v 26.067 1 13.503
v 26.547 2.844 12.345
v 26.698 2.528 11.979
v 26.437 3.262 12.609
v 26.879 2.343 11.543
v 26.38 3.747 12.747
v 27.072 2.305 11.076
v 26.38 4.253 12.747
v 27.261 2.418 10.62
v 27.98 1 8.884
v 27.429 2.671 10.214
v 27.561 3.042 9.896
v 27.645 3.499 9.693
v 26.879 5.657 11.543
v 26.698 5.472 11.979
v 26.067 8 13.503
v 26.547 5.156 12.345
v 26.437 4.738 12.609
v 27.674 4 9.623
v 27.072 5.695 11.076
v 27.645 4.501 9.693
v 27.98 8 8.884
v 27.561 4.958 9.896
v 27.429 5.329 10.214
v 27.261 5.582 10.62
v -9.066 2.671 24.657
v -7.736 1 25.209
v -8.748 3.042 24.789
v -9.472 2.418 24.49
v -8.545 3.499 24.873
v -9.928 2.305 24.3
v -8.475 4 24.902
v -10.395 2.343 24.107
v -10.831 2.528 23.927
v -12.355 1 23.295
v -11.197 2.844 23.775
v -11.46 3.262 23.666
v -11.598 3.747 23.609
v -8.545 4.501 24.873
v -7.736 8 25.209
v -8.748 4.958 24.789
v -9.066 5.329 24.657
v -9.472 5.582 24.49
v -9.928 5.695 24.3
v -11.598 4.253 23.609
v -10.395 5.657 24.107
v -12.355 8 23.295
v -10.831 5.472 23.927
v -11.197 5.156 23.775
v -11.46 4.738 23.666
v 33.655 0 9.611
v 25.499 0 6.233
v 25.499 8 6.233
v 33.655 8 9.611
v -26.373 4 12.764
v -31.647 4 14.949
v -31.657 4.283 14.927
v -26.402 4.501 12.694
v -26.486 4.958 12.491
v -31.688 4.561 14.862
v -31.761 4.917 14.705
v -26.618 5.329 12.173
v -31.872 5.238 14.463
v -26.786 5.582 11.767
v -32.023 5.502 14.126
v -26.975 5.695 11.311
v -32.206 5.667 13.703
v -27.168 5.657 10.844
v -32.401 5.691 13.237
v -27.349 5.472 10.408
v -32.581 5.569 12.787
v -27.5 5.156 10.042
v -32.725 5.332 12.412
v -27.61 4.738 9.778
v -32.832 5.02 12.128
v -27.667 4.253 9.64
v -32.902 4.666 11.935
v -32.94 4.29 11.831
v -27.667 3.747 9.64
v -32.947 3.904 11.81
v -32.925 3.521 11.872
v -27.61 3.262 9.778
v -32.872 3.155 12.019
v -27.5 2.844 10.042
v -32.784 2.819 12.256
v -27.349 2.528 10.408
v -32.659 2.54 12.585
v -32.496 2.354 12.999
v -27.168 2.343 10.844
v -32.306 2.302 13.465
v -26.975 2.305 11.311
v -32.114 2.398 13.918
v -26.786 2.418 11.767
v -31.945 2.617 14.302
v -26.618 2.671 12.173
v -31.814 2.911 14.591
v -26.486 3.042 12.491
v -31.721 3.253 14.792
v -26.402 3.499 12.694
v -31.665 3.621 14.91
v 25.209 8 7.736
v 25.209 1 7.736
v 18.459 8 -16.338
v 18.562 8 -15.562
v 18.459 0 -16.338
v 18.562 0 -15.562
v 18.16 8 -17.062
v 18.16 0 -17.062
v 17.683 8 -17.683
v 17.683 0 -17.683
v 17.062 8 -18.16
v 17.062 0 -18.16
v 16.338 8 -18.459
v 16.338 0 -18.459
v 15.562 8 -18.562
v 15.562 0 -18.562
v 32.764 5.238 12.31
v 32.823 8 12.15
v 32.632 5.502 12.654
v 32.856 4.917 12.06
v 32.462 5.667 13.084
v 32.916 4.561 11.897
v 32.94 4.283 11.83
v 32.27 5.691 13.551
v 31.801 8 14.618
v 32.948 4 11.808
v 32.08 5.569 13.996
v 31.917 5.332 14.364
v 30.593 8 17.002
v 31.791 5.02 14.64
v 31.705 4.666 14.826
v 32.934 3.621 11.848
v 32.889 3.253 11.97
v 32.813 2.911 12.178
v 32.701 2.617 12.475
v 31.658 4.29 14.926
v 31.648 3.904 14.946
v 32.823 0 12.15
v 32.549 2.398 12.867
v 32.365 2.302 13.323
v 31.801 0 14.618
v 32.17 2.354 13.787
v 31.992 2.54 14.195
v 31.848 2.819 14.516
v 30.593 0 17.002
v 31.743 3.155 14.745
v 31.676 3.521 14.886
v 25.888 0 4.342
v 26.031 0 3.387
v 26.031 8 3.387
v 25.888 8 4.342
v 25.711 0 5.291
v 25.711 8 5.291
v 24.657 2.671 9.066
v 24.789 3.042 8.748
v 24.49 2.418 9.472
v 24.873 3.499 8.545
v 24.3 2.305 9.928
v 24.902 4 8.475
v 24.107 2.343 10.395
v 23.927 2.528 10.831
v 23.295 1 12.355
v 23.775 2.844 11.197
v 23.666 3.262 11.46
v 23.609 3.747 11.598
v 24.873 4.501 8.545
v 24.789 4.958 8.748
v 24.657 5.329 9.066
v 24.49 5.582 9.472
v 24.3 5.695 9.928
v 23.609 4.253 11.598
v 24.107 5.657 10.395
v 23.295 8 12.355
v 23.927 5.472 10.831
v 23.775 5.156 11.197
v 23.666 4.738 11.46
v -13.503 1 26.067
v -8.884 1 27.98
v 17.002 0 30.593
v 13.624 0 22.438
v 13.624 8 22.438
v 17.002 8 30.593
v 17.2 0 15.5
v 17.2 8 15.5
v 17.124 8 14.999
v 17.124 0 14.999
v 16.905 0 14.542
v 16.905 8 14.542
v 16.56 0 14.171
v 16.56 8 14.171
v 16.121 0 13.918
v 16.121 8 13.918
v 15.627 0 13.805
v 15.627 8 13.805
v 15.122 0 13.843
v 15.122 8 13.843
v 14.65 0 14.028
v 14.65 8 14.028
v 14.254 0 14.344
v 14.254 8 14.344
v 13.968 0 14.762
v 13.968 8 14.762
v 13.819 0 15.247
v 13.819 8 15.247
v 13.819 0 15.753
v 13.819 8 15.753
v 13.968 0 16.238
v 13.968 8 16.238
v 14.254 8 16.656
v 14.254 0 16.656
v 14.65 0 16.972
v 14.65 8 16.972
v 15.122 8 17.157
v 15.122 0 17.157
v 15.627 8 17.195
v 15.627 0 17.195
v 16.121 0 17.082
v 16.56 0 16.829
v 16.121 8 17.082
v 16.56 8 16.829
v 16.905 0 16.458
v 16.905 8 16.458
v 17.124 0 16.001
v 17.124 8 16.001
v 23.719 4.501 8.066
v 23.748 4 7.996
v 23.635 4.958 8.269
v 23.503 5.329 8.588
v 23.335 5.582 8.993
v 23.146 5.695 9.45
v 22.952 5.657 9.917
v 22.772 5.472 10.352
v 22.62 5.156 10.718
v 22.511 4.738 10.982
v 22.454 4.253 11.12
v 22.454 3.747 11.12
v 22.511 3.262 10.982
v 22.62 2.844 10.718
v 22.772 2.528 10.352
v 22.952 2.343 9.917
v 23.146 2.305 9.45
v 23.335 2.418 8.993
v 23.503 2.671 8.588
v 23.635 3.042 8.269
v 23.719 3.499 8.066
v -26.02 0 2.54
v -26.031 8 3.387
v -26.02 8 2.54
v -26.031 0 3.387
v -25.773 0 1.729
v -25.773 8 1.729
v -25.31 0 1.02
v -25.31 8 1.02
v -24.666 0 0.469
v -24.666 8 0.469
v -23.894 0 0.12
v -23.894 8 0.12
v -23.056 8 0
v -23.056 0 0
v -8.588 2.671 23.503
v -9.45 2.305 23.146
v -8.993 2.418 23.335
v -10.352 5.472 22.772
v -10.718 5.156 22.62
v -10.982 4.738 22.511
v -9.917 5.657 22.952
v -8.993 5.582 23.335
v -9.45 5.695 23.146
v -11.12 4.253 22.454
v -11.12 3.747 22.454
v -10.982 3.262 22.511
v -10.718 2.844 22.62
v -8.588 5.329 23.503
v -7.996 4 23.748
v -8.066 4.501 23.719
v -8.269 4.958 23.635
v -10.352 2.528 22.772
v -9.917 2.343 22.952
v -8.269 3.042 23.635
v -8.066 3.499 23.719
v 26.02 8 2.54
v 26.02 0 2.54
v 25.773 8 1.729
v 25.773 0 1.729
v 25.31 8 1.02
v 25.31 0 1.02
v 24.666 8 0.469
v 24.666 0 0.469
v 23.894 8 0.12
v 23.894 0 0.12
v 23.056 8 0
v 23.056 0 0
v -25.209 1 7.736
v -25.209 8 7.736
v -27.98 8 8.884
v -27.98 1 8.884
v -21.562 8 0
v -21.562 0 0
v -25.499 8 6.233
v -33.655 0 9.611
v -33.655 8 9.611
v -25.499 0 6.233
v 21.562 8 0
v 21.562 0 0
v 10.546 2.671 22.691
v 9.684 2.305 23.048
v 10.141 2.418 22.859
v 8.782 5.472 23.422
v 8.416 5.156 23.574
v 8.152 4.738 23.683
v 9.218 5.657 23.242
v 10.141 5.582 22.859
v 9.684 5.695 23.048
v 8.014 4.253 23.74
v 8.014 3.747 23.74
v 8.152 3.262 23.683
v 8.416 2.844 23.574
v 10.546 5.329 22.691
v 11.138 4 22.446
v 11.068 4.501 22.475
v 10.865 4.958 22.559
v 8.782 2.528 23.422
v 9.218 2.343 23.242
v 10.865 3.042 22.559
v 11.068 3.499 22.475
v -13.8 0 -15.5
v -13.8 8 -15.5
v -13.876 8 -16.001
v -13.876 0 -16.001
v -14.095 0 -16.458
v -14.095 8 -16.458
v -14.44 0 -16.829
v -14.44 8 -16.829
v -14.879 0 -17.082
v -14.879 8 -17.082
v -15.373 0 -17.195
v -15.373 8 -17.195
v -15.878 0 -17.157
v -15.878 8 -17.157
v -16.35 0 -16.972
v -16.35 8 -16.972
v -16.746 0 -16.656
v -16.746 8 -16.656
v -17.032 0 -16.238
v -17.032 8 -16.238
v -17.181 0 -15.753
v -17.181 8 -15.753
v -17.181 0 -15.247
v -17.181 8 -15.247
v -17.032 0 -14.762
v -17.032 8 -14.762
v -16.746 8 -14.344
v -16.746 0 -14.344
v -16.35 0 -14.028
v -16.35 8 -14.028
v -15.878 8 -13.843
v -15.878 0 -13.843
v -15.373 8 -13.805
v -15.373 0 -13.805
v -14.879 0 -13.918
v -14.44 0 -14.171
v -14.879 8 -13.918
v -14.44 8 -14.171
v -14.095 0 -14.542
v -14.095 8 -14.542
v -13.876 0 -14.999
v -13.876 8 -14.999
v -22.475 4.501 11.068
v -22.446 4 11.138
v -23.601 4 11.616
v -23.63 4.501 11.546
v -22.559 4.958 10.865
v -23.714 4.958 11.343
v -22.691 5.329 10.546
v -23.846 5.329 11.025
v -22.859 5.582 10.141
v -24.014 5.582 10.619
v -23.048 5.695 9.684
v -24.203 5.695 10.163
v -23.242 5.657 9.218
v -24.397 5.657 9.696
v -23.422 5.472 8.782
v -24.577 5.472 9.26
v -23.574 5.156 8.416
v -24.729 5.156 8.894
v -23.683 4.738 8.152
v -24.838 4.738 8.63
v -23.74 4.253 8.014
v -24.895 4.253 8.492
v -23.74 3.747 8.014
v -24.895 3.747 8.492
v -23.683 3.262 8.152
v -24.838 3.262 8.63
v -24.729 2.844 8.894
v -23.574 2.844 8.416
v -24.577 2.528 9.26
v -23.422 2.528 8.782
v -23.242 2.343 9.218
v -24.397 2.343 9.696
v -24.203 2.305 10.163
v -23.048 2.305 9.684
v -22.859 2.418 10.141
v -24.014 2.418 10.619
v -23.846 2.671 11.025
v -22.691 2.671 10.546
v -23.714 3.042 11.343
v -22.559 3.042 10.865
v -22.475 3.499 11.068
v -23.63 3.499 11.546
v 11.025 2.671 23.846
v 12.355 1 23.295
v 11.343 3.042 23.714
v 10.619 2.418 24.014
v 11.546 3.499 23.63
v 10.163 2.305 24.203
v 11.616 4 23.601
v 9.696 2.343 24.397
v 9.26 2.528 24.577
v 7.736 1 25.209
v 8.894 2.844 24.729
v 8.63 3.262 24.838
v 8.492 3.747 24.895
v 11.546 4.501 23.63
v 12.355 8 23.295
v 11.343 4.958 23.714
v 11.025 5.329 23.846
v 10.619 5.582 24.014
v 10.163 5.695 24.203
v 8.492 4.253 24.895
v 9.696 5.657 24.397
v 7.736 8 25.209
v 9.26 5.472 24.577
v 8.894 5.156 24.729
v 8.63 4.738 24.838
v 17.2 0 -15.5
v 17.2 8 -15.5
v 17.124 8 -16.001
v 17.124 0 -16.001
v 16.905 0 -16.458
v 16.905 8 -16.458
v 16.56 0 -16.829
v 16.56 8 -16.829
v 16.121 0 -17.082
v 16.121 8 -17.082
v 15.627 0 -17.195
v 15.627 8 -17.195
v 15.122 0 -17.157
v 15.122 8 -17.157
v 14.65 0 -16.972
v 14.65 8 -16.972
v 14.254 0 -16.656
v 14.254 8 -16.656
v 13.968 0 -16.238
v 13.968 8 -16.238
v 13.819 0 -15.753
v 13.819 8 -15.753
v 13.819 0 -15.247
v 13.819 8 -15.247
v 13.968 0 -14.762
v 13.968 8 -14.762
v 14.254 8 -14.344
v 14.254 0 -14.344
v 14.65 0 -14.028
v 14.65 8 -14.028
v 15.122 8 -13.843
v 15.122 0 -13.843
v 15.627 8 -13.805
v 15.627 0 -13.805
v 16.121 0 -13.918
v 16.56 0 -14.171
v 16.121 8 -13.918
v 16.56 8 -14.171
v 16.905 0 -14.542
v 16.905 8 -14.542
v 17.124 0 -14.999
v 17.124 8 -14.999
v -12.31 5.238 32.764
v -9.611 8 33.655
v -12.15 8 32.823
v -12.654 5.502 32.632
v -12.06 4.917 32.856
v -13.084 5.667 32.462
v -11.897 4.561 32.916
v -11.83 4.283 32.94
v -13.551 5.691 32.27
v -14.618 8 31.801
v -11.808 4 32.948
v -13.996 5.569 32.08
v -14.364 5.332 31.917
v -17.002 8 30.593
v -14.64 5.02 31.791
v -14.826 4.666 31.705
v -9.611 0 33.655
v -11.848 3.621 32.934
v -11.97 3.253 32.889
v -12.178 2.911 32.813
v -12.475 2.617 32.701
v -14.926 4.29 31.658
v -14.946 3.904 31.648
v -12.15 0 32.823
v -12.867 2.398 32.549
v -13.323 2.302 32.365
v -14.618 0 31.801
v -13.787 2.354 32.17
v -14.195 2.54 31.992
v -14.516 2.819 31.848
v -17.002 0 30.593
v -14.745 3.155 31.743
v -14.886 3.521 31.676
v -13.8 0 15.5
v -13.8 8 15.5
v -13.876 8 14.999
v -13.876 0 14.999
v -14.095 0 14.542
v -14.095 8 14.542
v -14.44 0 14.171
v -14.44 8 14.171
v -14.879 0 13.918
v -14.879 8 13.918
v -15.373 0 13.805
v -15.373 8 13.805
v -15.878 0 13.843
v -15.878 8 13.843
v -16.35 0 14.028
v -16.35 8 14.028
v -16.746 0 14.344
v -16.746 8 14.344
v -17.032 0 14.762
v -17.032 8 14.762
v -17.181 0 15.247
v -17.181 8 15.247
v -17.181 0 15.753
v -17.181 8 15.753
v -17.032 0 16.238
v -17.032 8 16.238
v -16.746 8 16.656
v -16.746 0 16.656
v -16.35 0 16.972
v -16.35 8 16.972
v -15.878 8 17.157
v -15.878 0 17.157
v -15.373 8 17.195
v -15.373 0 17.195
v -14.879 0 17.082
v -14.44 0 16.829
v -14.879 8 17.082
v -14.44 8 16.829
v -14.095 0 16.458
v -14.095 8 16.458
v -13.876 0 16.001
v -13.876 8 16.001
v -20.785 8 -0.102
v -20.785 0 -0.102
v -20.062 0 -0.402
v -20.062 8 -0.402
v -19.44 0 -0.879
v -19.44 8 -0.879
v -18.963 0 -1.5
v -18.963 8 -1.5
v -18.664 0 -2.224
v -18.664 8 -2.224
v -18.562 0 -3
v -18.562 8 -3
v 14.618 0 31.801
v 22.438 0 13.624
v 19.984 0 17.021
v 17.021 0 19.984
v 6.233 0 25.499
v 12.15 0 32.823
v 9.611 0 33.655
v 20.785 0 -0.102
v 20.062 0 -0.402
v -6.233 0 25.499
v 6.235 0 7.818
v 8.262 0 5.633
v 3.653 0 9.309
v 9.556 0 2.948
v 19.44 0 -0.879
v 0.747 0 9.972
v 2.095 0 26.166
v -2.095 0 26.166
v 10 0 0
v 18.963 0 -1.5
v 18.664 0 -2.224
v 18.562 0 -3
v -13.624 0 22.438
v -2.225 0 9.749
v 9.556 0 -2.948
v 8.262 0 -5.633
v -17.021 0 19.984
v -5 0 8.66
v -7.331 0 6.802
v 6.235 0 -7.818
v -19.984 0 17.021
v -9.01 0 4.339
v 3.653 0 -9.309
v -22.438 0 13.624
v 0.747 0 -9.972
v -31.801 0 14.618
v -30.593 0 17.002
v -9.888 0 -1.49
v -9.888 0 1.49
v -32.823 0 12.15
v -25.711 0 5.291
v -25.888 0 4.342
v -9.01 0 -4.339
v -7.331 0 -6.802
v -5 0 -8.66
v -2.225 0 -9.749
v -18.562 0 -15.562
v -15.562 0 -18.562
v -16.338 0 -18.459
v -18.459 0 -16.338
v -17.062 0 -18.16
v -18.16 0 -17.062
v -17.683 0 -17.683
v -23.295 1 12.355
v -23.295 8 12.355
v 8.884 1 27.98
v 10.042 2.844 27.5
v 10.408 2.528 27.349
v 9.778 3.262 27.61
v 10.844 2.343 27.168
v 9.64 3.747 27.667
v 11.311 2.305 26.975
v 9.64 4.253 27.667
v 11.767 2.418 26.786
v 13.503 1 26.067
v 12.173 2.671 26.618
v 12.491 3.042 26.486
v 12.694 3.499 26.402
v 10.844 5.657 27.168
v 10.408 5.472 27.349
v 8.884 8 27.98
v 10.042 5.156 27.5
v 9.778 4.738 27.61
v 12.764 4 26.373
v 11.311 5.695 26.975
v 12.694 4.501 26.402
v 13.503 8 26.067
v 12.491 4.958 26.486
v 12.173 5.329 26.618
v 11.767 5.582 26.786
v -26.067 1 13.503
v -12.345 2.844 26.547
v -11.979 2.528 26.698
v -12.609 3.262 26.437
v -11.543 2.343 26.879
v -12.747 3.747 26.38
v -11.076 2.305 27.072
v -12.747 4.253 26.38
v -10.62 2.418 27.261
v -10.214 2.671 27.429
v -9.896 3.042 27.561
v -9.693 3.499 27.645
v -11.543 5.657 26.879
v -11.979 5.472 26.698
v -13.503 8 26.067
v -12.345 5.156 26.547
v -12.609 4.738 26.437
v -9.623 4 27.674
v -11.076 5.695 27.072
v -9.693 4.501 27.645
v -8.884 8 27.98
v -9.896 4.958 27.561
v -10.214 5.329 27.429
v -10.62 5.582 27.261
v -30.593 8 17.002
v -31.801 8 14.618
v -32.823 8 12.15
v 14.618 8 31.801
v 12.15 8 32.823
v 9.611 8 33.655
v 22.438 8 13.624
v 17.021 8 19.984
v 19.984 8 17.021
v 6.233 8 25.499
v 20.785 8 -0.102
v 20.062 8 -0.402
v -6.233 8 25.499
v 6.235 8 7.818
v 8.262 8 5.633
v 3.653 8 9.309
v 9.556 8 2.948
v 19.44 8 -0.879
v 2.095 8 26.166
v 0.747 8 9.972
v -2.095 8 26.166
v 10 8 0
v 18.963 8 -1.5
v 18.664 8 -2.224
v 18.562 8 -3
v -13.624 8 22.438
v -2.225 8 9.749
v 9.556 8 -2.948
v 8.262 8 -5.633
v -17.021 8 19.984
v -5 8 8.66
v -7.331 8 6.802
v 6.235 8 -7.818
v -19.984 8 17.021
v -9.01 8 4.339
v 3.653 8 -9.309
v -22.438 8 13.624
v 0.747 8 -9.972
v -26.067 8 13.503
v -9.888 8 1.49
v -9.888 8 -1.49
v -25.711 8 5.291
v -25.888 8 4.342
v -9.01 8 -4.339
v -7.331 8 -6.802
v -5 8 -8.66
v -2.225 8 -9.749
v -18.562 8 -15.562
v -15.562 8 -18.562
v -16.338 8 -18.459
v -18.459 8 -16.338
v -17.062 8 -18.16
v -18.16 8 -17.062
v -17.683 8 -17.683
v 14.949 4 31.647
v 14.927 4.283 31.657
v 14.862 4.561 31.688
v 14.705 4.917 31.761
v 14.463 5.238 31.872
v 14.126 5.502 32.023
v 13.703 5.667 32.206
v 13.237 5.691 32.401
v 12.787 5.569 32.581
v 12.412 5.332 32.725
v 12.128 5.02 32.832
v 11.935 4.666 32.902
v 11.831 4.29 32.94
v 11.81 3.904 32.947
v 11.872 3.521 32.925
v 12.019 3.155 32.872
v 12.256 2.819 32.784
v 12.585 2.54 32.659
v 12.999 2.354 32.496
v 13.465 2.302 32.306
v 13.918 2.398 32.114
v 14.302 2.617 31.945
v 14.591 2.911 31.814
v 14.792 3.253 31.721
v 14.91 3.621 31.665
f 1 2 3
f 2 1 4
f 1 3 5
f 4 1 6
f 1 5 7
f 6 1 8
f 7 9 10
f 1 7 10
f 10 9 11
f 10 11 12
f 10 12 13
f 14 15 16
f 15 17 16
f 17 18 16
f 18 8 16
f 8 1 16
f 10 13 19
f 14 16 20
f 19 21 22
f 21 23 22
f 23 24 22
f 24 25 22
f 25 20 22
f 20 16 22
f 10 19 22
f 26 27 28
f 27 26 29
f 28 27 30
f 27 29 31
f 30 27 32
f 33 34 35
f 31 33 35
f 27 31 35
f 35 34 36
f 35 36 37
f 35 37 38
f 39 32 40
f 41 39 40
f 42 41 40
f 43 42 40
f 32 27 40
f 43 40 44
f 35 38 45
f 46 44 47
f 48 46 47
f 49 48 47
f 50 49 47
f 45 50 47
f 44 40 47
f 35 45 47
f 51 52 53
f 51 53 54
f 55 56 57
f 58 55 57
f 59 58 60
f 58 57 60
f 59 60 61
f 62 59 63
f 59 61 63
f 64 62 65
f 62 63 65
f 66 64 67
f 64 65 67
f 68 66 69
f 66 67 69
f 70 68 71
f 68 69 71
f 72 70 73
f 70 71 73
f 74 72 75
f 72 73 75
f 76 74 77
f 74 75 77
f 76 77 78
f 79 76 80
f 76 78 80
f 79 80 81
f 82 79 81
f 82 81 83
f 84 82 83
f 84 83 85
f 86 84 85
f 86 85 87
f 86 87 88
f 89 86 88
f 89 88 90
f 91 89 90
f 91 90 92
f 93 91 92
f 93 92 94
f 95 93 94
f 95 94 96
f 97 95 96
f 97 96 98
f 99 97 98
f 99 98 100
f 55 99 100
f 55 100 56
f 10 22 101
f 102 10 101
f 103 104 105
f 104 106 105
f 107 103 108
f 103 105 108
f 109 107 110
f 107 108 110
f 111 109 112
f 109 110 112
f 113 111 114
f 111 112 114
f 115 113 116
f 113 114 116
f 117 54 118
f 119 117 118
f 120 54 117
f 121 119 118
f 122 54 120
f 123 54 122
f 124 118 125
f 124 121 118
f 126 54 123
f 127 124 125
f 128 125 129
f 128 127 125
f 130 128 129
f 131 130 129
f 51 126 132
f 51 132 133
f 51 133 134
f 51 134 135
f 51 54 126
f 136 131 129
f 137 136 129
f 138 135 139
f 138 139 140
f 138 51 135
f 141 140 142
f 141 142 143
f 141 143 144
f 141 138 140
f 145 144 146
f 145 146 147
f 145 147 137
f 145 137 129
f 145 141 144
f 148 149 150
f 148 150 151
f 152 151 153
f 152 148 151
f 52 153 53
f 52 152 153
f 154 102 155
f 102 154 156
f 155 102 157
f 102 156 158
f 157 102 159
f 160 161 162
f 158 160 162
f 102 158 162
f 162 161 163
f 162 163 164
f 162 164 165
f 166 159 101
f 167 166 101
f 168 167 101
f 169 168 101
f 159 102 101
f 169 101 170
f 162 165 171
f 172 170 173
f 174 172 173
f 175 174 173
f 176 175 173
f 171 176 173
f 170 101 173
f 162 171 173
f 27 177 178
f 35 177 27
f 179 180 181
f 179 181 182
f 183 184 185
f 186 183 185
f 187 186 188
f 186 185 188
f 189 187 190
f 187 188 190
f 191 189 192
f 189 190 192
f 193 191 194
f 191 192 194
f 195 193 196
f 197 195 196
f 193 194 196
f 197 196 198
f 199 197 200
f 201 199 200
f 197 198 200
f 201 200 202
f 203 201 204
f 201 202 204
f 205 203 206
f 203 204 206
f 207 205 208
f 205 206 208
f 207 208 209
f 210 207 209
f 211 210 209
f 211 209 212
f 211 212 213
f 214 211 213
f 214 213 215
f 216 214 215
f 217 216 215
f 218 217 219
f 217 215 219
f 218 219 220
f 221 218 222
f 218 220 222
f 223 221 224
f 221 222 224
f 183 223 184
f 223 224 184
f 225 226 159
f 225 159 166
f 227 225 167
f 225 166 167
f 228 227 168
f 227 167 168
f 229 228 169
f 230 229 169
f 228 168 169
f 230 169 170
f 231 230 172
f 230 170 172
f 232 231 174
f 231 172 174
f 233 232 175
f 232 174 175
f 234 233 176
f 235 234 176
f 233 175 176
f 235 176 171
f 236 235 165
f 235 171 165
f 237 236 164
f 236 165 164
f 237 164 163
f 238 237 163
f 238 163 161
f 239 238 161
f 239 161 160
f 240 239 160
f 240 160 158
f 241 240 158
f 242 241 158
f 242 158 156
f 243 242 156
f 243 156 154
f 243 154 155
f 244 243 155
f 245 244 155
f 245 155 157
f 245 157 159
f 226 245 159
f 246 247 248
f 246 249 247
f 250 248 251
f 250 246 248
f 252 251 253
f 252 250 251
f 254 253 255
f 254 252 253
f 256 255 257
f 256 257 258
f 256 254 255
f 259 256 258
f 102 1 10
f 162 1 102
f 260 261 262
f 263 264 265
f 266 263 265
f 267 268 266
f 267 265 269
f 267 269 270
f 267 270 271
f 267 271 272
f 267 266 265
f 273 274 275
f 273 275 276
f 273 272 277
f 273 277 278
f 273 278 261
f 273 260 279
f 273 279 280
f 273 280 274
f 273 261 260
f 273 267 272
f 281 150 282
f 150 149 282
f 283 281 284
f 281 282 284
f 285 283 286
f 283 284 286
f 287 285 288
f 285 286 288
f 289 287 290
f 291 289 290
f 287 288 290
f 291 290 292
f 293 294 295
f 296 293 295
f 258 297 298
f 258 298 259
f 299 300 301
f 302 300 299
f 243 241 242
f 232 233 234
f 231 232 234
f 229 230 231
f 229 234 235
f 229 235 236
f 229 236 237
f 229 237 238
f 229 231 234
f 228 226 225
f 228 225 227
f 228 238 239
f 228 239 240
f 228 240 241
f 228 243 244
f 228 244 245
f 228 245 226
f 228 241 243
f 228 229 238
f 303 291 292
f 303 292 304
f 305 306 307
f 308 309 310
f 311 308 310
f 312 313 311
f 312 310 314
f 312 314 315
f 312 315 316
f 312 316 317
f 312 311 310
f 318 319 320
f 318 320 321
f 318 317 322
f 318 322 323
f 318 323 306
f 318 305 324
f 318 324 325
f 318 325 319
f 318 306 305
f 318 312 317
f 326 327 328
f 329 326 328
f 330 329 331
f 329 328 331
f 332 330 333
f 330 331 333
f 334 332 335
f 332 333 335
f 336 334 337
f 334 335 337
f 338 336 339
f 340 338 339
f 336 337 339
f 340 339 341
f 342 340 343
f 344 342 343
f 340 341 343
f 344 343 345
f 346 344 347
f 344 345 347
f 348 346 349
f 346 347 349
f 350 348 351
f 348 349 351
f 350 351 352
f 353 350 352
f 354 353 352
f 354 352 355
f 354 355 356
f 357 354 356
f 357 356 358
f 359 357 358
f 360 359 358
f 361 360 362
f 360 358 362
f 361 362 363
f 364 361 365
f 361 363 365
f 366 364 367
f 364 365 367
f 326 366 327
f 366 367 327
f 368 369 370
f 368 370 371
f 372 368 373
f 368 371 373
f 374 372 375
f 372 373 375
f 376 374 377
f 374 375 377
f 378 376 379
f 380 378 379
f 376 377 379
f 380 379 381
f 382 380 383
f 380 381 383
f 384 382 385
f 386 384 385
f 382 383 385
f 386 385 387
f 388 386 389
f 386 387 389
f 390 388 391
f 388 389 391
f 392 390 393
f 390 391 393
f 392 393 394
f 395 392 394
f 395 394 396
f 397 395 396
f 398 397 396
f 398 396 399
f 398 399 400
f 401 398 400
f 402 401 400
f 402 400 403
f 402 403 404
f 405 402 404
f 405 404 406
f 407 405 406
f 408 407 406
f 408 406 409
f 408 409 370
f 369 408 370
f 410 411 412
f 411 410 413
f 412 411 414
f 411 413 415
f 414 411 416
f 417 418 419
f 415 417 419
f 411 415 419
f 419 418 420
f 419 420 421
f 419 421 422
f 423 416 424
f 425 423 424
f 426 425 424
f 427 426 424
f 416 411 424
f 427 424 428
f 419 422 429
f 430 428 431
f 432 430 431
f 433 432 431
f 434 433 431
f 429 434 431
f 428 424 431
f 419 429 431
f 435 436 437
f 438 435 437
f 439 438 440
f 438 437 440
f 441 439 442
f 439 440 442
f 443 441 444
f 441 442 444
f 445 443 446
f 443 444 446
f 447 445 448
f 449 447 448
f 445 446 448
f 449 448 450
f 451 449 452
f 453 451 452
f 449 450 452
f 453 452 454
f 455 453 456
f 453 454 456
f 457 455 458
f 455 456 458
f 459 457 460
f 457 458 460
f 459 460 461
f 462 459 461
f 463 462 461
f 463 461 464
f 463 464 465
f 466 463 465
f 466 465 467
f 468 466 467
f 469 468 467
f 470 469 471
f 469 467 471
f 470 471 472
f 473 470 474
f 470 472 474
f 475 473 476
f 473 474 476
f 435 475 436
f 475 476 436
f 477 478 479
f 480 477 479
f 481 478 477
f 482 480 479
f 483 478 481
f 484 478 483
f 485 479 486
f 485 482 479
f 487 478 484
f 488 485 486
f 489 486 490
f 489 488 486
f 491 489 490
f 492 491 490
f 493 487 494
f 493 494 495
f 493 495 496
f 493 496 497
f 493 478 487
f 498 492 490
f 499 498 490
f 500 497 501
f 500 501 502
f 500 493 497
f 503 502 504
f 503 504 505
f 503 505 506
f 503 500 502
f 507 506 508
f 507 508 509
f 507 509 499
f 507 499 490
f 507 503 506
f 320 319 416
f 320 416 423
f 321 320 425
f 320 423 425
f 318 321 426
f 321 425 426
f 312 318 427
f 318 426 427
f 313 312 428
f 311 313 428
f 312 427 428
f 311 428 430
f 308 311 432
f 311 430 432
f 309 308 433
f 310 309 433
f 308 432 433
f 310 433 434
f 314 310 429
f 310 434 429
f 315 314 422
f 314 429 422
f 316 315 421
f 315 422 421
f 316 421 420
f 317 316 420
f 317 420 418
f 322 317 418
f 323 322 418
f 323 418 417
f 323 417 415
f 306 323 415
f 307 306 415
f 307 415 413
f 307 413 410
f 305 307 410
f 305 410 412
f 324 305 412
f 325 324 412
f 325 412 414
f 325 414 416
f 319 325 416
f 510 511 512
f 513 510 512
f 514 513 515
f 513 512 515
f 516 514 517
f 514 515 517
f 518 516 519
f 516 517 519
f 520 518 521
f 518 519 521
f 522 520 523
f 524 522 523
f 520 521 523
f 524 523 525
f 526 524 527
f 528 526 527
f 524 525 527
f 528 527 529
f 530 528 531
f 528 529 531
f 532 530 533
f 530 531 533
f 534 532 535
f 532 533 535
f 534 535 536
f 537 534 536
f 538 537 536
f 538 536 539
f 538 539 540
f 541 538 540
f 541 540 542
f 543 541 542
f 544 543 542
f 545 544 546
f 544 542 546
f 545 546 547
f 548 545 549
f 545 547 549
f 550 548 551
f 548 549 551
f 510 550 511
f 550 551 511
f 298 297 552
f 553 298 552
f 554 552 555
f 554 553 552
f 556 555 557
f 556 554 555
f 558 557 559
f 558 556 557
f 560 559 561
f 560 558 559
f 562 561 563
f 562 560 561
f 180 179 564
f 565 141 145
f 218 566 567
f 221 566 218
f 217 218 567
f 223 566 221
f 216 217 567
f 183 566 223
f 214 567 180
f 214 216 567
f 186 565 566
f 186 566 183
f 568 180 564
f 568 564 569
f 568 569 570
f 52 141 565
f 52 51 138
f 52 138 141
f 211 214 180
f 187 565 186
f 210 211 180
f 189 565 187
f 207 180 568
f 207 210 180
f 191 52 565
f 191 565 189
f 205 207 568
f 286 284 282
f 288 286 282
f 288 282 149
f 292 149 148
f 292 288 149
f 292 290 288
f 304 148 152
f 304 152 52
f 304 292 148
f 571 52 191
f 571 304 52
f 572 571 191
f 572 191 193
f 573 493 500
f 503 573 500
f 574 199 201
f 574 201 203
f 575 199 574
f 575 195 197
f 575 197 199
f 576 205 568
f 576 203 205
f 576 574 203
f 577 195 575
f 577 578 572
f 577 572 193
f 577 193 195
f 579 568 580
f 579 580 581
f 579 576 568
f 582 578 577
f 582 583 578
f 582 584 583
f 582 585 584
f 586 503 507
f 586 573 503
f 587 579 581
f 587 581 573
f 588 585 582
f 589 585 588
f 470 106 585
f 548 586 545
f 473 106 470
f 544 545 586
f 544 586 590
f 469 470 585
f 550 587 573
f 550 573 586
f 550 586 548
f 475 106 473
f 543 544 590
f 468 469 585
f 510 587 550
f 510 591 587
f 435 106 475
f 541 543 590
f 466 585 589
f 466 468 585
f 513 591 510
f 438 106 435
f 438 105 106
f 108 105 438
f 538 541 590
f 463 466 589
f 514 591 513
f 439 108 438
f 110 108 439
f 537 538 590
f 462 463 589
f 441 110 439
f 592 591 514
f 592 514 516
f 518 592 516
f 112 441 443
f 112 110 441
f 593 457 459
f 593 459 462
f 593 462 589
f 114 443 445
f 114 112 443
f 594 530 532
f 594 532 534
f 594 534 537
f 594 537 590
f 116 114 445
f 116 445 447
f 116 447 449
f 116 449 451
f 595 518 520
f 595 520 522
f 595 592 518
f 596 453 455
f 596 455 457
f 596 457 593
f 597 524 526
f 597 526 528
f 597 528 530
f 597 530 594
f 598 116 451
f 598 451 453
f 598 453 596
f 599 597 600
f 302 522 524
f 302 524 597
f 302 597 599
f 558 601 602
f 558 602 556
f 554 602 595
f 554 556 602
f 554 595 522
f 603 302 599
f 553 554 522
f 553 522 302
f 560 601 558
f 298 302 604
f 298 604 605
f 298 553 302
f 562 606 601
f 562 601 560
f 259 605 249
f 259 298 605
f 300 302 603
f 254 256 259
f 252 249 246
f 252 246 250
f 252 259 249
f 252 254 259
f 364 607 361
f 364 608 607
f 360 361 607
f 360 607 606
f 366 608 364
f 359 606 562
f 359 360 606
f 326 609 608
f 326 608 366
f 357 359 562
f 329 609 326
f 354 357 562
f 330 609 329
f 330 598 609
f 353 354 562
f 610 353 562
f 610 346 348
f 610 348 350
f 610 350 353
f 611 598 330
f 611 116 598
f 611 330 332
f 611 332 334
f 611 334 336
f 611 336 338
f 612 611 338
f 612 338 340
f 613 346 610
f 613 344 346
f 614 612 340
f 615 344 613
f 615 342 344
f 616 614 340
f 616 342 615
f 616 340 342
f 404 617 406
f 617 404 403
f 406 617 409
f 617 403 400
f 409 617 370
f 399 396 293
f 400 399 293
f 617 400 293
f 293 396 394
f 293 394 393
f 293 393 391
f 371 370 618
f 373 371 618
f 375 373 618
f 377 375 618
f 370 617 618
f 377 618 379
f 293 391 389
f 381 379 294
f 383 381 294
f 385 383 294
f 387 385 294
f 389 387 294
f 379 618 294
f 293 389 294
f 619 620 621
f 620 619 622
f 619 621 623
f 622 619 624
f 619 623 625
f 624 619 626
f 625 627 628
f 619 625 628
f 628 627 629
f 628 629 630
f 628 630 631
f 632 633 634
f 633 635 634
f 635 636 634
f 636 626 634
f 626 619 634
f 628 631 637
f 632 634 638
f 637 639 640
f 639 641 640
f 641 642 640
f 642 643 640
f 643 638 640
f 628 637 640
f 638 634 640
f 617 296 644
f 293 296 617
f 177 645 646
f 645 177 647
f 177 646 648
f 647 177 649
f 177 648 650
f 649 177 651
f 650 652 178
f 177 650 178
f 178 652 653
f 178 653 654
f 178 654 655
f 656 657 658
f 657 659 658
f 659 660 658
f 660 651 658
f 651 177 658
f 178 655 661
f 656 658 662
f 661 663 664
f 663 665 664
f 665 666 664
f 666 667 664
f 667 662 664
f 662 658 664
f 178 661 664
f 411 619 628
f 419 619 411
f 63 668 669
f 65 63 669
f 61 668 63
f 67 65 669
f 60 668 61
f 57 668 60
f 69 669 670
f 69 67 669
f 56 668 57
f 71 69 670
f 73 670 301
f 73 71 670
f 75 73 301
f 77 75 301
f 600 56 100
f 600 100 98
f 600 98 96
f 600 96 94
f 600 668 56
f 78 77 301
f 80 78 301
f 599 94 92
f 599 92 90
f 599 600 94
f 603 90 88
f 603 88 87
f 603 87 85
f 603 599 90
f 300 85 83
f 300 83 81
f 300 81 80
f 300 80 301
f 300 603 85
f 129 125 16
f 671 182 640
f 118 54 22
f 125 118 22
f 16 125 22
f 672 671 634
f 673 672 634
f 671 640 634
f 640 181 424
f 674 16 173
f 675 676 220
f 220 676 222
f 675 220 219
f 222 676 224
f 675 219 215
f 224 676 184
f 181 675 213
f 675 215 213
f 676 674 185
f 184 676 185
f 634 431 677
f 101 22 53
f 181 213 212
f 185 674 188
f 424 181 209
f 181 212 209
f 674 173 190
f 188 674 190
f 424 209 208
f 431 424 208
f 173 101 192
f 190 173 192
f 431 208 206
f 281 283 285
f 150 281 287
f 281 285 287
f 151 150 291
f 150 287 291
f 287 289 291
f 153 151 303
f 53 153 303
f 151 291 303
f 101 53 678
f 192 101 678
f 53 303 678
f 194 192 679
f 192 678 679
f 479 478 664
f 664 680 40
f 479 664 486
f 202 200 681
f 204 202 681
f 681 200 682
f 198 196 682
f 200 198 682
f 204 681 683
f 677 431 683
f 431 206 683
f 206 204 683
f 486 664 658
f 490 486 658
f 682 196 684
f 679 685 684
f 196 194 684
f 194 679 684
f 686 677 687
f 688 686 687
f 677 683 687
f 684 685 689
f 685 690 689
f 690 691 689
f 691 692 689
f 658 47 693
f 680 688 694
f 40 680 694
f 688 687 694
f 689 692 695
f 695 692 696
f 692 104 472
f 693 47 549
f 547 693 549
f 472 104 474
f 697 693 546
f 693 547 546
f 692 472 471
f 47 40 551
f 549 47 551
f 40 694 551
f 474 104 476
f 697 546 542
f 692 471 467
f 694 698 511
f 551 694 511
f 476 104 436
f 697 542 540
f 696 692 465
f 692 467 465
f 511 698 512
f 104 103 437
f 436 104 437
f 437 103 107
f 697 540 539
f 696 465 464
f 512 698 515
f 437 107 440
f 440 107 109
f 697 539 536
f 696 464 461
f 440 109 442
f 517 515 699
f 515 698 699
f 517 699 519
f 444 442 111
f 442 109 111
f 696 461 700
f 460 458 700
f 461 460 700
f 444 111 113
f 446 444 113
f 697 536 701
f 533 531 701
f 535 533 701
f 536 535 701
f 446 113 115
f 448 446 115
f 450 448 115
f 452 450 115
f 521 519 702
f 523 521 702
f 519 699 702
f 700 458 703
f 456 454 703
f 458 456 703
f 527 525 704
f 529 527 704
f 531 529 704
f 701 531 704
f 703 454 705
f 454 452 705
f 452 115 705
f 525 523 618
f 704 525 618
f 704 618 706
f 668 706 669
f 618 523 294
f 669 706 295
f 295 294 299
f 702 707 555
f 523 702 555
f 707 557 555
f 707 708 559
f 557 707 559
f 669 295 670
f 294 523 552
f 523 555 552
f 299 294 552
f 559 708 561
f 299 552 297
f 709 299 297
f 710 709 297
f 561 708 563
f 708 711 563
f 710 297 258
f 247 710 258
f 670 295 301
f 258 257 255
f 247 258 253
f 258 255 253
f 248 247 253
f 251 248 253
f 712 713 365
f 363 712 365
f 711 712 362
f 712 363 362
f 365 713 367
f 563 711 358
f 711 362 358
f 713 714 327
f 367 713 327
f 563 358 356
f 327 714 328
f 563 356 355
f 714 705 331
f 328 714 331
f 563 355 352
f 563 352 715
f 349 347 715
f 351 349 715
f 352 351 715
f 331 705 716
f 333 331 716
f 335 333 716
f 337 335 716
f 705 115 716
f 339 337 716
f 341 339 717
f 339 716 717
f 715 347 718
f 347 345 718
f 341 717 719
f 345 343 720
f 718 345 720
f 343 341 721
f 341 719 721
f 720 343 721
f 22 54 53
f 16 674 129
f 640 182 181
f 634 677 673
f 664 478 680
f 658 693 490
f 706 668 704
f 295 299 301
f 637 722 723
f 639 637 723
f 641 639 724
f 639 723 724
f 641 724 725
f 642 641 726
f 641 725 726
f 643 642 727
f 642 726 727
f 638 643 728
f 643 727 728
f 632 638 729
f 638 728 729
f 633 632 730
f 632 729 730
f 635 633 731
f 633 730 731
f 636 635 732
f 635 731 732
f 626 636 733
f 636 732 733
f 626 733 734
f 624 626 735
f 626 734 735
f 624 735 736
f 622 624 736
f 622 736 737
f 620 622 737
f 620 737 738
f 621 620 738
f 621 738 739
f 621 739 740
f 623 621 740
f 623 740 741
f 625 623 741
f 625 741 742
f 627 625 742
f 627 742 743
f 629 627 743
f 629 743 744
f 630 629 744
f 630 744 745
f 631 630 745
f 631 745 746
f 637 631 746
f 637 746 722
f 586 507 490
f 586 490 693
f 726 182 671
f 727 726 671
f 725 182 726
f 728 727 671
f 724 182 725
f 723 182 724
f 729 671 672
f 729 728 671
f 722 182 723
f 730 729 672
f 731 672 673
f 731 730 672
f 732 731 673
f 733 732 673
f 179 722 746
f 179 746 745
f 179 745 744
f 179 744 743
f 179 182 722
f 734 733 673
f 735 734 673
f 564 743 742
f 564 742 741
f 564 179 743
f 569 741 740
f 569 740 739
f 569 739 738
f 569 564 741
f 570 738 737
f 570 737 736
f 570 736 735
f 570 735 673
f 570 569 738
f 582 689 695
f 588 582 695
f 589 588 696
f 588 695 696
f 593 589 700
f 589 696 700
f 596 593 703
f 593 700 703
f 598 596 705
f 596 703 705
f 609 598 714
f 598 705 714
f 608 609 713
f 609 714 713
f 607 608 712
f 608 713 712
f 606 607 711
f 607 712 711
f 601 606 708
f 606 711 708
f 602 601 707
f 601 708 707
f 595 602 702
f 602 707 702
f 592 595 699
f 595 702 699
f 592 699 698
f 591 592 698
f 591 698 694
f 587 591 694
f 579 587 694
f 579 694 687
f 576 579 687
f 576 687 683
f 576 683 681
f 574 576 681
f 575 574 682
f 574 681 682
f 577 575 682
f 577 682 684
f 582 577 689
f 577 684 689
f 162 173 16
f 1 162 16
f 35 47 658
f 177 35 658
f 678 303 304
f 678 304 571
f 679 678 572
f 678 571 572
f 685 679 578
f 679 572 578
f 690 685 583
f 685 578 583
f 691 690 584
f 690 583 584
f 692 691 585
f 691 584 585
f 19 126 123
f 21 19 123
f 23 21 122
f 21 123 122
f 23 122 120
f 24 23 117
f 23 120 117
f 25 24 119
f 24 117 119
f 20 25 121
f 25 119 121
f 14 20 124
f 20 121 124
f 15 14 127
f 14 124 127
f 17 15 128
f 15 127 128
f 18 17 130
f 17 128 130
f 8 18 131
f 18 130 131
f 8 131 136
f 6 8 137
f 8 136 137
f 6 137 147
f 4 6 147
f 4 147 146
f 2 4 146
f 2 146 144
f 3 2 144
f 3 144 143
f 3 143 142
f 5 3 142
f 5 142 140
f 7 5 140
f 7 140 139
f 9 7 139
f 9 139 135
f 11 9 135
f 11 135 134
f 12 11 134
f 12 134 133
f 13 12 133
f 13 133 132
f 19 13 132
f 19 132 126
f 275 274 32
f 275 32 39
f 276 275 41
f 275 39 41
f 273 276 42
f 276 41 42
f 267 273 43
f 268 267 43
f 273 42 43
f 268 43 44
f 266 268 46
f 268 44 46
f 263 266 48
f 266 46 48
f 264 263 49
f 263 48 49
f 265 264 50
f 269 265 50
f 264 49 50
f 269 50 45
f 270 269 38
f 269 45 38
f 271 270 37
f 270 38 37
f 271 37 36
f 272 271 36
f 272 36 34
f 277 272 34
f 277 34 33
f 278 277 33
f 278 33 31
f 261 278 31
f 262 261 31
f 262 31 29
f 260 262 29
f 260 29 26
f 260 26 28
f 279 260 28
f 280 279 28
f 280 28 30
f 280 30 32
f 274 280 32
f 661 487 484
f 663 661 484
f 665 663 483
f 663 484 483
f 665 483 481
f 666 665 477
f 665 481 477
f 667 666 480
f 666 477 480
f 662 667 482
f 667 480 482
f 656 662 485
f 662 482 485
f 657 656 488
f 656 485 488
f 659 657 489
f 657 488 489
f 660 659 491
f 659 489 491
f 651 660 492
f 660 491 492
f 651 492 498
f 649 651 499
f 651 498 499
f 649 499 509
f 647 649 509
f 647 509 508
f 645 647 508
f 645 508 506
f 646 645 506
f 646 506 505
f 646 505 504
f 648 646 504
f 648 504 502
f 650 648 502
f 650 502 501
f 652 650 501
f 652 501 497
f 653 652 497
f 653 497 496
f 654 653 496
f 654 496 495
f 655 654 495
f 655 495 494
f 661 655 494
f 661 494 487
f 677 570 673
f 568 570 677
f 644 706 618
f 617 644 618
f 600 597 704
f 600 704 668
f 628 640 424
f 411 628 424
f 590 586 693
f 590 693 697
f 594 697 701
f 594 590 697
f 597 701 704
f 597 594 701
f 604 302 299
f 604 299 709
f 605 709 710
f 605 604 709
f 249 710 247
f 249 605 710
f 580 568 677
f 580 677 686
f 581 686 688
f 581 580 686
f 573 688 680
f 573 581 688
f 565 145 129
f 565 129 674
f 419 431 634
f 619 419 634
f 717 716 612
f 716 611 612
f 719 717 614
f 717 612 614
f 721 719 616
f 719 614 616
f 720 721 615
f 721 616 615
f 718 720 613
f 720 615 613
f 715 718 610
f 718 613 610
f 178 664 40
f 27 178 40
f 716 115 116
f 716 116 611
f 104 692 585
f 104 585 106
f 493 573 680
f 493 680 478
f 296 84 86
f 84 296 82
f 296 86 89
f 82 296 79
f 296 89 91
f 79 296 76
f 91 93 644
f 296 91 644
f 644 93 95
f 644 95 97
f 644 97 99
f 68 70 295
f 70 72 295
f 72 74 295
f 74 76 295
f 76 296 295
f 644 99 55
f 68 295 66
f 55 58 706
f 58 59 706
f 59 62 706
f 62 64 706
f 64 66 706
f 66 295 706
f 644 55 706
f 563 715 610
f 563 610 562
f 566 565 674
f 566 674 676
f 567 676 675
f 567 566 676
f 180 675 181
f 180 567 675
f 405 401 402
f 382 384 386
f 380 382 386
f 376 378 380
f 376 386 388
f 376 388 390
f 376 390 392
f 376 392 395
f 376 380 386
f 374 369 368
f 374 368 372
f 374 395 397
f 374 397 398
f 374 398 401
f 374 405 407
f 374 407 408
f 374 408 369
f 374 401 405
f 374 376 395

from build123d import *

# Parameters (mm, degrees)
SALIENTE_EXTRUIR1_DEPTH = 8
CROQUIS3_R              = 1.7
CORTAR_EXTRUIR1_DEPTH   = 10
CORTAR_EXTRUIR2_DEPTH   = 7
MATRIZC1_COUNT          = 4
MATRIZC1_ANGLE          = 135
CROQUIS5_R              = 10
CROQUIS5_R_2            = 1.7
CORTAR_EXTRUIR3_DEPTH   = 8
CORTAR_EXTRUIR4_DEPTH   = 8
REDONDEO1_R             = 3


with BuildPart() as part:
    # Croquis1 → Saliente-Extruir1 (new body)
    with BuildSketch(Plane(origin=(0, 0, 0), x_dir=(1, 0, 0), z_dir=(0, 1, 0))):
        with BuildLine():
            Line((-33.65465082, -9.610644005), (-25.499354444, -6.232609641))
            ThreePointArc((-25.499354444, -6.232609641), (0, 26.25), (25.499354444, -6.232609641))
            Line((25.499354444, -6.232609641), (33.65465082, -9.610644005))
            ThreePointArc((33.65465082, -9.610644005), (32.335783638, -13.393920133), (30.593183361, -17.001680265))
            Line((30.593183361, -17.001680265), (22.437886985, -13.623645901))
            ThreePointArc((22.437886985, -13.623645901), (18.561553006, -18.561553006), (13.623645901, -22.437886985))
            Line((13.623645901, -22.437886985), (17.001680265, -30.593183361))
            ThreePointArc((17.001680265, -30.593183361), (13.393920133, -32.335783638), (9.610644005, -33.65465082))
            Line((9.610644005, -33.65465082), (6.232609641, -25.499354444))
            ThreePointArc((6.232609641, -25.499354444), (0, -26.25), (-6.232609641, -25.499354444))
            Line((-6.232609641, -25.499354444), (-9.610644005, -33.65465082))
            ThreePointArc((-9.610644005, -33.65465082), (-13.393920133, -32.335783638), (-17.001680265, -30.593183361))
            Line((-17.001680265, -30.593183361), (-13.623645901, -22.437886985))
            ThreePointArc((-13.623645901, -22.437886985), (-18.561553006, -18.561553006), (-22.437886985, -13.623645901))
            Line((-22.437886985, -13.623645901), (-30.593183361, -17.001680265))
            ThreePointArc((-30.593183361, -17.001680265), (-32.335783638, -13.393920133), (-33.65465082, -9.610644005))
        make_face()
    extrude(amount=SALIENTE_EXTRUIR1_DEPTH)

    # Croquis3 → Cortar-Extruir1 (cut)
    with BuildSketch(Plane(origin=(-32.335783638, 0, 13.393920133), x_dir=(0.382683432, 0, 0.923879533), z_dir=(-0.923879533, 0, 0.382683432))):
        with Locations((0, 4)):
            Circle(CROQUIS3_R)
    cortar_extruir1 = extrude(amount=-CORTAR_EXTRUIR1_DEPTH, mode=Mode.SUBTRACT)

    # Croquis4 → Cortar-Extruir2 (cut)
    with BuildSketch(Plane(origin=(0, 8, 0), x_dir=(1, 0, 0), z_dir=(0, 1, 0))):
        Polygon((-27.980184907, -8.883791565), (-26.066767745, -13.503189228), (-23.295129148, -12.355138931), (-25.208546309, -7.735741268), align=None)
    cortar_extruir2 = extrude(amount=-CORTAR_EXTRUIR2_DEPTH, mode=Mode.SUBTRACT)

    # MatrizC1: Cortar-Extruir1, Cortar-Extruir2 ×4 about axis
    matrizc1_axis = Axis((0, 0, 0), (0, 1, 0))
    for i in range(1, MATRIZC1_COUNT):
        add(cortar_extruir1.rotate(matrizc1_axis, i * MATRIZC1_ANGLE / (MATRIZC1_COUNT - 1)), mode=Mode.SUBTRACT)
        add(cortar_extruir2.rotate(matrizc1_axis, i * MATRIZC1_ANGLE / (MATRIZC1_COUNT - 1)), mode=Mode.SUBTRACT)

    # Croquis5 → Cortar-Extruir3 (cut)
    with BuildSketch(Plane(origin=(0, 8, 0), x_dir=(1, 0, 0), z_dir=(0, 1, 0))):
        Circle(CROQUIS5_R)
        with Locations((-15.5, 15.5)):
            Circle(CROQUIS5_R_2)
        with Locations((15.5, 15.5)):
            Circle(CROQUIS5_R_2)
        with Locations((15.5, -15.5)):
            Circle(CROQUIS5_R_2)
        with Locations((-15.5, -15.5)):
            Circle(CROQUIS5_R_2)
    extrude(amount=-CORTAR_EXTRUIR3_DEPTH, mode=Mode.SUBTRACT)

    # Croquis6 → Cortar-Extruir4 (cut)
    with BuildSketch(Plane(origin=(0, 8, 0), x_dir=(1, 0, 0), z_dir=(0, 1, 0))):
        Polygon((18.561553006, 18.561553006), (-18.561553006, 18.561553006), (-18.561553006, 0), (-26.25, 0), (-26.25, 31.288102552), (26.25, 31.288102552), (26.25, 0), (18.561553006, 0), align=None)
    extrude(amount=-CORTAR_EXTRUIR4_DEPTH, mode=Mode.SUBTRACT)

    # Redondeo1
    redondeo1_edges = [part.edges().sort_by_distance(p)[0] for p in [
        (-18.561553006, 4, -18.561553006),
        (-18.561553006, 4, 0),
        (-26.25, 4, 0),
        (26.25, 4, 0),
        (18.561553006, 4, 0),
        (18.561553006, 4, -18.561553006),
    ]]
    fillet(redondeo1_edges, radius=REDONDEO1_R)


solid = part.part
